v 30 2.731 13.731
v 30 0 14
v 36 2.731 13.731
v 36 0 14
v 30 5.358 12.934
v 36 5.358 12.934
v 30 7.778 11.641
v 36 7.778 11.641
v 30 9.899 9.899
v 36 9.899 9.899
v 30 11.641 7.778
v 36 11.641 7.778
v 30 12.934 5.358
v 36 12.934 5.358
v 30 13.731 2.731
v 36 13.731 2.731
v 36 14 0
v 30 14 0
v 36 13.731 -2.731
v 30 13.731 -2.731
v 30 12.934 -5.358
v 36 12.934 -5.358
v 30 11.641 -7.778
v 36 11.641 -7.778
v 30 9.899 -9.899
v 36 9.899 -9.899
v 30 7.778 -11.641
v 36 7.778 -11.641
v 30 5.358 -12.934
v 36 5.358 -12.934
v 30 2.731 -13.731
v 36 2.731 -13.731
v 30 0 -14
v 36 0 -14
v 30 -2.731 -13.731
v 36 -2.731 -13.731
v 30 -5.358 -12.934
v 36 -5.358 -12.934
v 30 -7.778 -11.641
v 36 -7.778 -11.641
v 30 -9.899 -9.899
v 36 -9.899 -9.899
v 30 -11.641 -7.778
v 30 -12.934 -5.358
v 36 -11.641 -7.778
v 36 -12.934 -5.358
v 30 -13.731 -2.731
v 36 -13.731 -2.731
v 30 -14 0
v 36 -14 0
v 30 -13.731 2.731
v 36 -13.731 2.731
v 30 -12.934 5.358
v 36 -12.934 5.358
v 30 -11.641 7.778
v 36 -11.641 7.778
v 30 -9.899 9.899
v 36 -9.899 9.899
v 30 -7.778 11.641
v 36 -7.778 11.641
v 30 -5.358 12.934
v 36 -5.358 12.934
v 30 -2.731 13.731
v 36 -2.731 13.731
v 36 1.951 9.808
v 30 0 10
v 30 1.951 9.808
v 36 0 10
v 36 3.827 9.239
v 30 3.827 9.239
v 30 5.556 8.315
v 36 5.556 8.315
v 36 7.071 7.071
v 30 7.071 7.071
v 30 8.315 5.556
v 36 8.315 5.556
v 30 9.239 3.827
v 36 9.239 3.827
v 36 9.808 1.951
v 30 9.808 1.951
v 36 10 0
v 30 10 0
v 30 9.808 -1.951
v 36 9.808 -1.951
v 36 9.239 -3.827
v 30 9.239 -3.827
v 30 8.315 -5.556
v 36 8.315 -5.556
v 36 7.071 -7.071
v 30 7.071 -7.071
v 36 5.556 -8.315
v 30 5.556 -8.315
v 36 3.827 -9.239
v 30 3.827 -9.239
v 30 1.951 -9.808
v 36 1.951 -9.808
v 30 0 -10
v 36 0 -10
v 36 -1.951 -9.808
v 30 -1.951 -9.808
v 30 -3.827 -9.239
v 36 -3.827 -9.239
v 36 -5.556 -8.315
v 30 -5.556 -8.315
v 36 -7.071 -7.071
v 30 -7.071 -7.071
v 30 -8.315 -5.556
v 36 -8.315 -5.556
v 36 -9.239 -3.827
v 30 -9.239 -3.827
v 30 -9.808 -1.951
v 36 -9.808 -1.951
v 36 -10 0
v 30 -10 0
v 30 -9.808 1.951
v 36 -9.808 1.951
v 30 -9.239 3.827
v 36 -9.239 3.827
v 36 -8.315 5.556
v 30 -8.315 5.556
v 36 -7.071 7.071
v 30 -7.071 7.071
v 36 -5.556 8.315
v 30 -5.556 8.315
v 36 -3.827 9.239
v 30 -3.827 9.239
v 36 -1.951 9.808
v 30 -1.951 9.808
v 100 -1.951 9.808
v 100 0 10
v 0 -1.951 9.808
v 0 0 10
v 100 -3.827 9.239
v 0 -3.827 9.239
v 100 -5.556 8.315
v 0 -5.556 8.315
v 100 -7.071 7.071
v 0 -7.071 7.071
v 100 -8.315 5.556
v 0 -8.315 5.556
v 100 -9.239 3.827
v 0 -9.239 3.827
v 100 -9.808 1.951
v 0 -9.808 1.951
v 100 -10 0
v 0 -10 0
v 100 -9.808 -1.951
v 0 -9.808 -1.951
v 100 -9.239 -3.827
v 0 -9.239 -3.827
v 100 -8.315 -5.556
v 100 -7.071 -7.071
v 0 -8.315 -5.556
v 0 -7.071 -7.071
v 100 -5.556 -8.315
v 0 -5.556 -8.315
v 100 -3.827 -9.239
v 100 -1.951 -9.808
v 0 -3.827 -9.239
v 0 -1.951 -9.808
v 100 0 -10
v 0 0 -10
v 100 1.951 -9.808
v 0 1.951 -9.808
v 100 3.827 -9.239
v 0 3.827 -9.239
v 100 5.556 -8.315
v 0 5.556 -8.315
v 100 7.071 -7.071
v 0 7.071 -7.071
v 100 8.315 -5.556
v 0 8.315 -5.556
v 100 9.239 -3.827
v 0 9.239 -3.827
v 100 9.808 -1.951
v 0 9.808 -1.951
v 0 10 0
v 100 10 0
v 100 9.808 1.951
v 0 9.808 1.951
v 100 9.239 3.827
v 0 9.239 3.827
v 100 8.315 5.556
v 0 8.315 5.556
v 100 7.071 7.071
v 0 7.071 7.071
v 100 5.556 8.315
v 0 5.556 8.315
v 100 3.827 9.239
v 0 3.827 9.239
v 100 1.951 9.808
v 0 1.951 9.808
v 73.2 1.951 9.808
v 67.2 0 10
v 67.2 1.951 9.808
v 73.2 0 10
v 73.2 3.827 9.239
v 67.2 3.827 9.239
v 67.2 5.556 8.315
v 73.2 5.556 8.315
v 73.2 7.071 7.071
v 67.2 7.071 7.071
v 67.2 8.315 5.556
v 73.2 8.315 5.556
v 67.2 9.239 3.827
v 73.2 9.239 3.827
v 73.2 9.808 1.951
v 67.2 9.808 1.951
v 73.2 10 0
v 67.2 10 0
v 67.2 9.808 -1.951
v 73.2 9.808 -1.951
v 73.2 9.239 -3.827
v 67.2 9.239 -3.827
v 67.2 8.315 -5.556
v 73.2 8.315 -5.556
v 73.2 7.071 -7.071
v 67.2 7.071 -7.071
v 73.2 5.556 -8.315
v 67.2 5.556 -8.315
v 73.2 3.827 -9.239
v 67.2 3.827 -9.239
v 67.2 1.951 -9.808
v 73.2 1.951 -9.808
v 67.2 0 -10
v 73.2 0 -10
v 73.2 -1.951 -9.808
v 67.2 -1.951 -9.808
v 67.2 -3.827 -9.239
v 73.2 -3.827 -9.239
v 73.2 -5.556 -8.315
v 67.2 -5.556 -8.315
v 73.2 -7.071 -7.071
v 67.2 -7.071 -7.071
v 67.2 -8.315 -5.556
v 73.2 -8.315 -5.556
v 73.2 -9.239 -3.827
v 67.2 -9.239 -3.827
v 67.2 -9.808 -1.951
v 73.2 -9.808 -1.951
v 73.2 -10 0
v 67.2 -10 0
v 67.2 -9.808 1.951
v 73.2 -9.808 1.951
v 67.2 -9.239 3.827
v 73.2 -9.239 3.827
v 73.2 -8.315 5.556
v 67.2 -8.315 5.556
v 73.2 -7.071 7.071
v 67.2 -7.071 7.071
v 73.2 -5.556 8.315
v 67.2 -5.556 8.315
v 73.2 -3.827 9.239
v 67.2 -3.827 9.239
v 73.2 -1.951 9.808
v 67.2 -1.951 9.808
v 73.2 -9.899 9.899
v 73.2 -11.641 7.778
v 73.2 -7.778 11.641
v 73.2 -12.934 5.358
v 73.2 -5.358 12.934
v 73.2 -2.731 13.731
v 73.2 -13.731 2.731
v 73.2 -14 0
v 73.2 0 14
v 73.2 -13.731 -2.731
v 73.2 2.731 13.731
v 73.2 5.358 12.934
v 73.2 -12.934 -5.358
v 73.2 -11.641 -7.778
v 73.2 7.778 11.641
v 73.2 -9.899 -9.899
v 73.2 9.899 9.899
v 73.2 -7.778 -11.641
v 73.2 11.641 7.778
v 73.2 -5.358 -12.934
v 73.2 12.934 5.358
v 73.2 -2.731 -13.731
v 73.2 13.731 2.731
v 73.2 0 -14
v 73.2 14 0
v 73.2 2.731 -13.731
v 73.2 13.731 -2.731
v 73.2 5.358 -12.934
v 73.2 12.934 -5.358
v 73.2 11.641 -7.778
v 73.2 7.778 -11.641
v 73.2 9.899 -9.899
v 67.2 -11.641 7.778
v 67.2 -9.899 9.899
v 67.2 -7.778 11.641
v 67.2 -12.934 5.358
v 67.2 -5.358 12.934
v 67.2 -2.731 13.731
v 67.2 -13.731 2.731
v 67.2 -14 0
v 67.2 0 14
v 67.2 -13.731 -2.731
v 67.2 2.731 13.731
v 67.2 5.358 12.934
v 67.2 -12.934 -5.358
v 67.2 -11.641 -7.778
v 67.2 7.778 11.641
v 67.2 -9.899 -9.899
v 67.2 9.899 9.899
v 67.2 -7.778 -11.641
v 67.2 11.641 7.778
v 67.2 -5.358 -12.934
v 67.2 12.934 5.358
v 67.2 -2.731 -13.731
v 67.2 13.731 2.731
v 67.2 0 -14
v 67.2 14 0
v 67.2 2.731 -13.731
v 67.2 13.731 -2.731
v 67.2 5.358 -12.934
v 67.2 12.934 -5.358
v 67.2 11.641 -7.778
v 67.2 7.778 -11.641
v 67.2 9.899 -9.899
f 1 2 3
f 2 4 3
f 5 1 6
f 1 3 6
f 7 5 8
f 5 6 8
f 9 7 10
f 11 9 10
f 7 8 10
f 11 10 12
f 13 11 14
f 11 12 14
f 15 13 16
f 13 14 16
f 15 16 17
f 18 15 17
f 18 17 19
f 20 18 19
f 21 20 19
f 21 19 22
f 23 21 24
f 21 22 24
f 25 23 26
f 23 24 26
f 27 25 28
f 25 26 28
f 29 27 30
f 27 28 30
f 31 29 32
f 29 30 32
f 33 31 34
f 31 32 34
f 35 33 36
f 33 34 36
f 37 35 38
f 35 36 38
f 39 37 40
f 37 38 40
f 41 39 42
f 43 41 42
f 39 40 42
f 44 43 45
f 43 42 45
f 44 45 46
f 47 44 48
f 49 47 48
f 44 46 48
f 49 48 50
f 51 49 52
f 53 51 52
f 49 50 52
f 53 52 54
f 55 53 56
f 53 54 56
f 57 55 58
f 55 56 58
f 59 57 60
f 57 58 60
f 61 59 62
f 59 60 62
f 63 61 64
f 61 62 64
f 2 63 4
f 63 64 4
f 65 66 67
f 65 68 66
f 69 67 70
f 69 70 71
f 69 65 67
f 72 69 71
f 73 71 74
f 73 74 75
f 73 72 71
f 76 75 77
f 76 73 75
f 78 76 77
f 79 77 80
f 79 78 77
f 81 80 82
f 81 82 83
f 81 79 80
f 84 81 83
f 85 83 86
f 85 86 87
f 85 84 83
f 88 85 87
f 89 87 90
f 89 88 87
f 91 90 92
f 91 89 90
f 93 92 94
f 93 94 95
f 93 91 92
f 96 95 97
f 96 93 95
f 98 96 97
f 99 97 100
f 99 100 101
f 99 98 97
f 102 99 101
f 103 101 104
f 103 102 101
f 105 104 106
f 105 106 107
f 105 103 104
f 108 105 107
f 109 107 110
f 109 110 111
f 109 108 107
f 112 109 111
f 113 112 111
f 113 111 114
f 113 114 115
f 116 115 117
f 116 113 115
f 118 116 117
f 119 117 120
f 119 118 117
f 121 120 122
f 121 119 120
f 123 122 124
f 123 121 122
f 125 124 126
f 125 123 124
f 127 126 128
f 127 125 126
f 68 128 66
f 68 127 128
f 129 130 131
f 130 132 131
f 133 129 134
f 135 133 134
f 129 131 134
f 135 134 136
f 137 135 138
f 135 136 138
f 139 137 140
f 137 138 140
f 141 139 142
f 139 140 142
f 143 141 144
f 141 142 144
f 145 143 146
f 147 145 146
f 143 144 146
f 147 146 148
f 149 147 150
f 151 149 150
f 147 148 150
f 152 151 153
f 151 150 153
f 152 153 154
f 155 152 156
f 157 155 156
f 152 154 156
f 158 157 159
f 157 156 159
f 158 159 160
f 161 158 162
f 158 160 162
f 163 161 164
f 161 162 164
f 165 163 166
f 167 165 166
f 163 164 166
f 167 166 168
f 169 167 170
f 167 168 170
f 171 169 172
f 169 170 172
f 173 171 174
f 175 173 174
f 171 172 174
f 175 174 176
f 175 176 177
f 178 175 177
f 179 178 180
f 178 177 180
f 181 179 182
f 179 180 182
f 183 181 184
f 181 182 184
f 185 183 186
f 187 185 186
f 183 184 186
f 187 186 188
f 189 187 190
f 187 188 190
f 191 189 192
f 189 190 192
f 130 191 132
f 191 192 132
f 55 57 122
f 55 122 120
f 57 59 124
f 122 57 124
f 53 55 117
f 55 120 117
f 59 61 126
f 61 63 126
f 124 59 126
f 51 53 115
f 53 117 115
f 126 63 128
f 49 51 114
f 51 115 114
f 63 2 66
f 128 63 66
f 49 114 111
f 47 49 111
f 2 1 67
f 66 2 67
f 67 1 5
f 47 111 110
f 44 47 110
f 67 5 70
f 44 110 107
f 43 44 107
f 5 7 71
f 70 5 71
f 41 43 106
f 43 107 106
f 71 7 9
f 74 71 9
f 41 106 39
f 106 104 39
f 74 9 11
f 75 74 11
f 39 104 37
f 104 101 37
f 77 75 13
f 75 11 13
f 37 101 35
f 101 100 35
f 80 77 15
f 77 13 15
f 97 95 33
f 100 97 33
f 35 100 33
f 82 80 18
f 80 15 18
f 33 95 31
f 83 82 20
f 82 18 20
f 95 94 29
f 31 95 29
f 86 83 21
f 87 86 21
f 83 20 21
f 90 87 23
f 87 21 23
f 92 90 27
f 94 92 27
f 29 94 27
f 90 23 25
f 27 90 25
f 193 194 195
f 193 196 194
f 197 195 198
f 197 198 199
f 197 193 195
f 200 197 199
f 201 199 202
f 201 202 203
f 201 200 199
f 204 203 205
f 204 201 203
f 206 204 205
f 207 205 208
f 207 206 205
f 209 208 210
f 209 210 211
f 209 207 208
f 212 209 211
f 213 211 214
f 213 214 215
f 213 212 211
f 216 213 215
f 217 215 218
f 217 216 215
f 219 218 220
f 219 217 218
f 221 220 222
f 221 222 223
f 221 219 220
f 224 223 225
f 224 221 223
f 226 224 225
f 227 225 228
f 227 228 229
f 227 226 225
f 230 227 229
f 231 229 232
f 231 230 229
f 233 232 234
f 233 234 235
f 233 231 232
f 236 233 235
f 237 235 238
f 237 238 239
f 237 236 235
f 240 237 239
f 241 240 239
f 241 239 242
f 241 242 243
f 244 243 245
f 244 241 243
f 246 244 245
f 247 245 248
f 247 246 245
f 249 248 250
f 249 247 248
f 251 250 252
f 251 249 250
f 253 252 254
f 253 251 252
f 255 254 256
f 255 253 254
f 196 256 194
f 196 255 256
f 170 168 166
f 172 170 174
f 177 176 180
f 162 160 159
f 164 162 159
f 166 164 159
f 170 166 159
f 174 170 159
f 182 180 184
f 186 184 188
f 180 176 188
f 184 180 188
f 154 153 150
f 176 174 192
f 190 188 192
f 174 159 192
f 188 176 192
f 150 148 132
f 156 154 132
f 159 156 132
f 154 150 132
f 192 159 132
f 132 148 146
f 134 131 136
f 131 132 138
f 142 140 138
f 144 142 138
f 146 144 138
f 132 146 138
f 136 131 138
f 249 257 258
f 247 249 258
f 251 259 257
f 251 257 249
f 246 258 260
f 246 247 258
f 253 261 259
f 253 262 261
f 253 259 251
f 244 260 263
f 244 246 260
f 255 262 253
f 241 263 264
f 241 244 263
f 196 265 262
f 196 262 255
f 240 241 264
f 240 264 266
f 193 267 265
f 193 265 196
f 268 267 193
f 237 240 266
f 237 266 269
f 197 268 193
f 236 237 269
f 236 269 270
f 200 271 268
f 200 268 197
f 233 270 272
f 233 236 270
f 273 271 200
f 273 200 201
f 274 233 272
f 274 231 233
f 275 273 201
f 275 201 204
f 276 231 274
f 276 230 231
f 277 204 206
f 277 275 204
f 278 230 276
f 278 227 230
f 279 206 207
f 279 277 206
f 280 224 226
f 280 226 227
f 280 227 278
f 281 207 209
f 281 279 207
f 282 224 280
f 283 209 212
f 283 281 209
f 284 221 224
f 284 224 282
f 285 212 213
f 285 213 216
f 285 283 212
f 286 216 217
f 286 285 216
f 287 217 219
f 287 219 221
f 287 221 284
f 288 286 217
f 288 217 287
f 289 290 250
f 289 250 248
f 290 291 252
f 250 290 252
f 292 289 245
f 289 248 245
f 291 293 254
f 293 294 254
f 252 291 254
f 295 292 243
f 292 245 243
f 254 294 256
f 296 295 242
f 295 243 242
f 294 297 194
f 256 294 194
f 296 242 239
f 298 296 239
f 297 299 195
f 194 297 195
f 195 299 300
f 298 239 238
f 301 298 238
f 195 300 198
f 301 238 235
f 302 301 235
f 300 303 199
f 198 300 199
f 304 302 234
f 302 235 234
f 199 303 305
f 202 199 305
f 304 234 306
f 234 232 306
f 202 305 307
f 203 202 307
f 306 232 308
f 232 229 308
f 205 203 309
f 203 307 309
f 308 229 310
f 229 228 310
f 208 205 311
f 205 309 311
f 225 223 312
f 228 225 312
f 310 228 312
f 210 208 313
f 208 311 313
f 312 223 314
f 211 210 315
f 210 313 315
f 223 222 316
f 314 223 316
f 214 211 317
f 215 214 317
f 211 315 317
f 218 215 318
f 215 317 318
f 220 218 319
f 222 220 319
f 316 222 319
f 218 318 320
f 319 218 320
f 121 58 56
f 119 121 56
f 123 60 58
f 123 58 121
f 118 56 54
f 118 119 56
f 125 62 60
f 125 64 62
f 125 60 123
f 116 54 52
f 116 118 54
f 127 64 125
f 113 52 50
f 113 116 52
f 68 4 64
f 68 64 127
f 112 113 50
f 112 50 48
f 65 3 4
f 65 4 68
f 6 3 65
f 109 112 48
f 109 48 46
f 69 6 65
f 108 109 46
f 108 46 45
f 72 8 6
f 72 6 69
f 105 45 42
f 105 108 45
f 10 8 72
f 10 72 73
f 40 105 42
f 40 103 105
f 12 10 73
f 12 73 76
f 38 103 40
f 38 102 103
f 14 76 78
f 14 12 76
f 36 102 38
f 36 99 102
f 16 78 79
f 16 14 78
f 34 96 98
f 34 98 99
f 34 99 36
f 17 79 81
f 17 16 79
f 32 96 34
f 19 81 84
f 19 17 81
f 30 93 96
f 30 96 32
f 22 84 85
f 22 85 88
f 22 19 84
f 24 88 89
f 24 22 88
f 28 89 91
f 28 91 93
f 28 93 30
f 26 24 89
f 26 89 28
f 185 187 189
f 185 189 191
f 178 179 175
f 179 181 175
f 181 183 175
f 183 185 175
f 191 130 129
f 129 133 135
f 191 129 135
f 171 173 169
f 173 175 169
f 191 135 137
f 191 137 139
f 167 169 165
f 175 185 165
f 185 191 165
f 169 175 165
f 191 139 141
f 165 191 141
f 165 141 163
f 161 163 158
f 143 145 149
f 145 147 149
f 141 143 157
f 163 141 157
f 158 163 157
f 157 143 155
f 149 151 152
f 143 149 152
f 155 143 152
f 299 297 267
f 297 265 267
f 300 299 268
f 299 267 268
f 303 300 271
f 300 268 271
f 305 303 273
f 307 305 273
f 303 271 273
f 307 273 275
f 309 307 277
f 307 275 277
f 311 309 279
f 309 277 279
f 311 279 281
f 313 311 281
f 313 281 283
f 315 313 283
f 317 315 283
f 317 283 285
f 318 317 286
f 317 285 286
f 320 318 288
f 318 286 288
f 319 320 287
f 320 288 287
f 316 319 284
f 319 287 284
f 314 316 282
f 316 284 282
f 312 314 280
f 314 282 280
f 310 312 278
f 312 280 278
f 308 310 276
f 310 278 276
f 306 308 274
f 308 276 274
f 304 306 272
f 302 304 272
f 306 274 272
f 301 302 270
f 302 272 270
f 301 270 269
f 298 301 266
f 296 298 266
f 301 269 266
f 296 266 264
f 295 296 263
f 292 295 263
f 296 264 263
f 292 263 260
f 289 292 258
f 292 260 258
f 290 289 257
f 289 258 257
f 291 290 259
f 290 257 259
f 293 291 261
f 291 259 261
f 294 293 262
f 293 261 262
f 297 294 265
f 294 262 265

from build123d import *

# Parameters (mm, degrees)
F0_W = 6
F0_H = 4


with BuildPart() as f1:
    # F0 (on Front) → F1 (revolve)
    with BuildSketch(Plane.XZ):
        Polygon((0, 10), (0, 0), (100, 0), (100, 10), (73.2, 10), (67.2, 10), (36, 10), (30, 10), align=None)
    revolve(axis=Axis((1.207729, 0, 0), (1, 0, 0)))


with BuildPart() as f2:
    # F0 (on Front) → F2 (revolve)
    with BuildSketch(Plane.XZ):
        with Locations((70.2, 12)):
            Rectangle(F0_W, F0_H)
        with Locations((33, 12)):
            Rectangle(F0_W, F0_H)
    revolve(axis=Axis((50, 0, 0), (-1, 0, 0)))


solid = Compound([f1.part, f2.part])
